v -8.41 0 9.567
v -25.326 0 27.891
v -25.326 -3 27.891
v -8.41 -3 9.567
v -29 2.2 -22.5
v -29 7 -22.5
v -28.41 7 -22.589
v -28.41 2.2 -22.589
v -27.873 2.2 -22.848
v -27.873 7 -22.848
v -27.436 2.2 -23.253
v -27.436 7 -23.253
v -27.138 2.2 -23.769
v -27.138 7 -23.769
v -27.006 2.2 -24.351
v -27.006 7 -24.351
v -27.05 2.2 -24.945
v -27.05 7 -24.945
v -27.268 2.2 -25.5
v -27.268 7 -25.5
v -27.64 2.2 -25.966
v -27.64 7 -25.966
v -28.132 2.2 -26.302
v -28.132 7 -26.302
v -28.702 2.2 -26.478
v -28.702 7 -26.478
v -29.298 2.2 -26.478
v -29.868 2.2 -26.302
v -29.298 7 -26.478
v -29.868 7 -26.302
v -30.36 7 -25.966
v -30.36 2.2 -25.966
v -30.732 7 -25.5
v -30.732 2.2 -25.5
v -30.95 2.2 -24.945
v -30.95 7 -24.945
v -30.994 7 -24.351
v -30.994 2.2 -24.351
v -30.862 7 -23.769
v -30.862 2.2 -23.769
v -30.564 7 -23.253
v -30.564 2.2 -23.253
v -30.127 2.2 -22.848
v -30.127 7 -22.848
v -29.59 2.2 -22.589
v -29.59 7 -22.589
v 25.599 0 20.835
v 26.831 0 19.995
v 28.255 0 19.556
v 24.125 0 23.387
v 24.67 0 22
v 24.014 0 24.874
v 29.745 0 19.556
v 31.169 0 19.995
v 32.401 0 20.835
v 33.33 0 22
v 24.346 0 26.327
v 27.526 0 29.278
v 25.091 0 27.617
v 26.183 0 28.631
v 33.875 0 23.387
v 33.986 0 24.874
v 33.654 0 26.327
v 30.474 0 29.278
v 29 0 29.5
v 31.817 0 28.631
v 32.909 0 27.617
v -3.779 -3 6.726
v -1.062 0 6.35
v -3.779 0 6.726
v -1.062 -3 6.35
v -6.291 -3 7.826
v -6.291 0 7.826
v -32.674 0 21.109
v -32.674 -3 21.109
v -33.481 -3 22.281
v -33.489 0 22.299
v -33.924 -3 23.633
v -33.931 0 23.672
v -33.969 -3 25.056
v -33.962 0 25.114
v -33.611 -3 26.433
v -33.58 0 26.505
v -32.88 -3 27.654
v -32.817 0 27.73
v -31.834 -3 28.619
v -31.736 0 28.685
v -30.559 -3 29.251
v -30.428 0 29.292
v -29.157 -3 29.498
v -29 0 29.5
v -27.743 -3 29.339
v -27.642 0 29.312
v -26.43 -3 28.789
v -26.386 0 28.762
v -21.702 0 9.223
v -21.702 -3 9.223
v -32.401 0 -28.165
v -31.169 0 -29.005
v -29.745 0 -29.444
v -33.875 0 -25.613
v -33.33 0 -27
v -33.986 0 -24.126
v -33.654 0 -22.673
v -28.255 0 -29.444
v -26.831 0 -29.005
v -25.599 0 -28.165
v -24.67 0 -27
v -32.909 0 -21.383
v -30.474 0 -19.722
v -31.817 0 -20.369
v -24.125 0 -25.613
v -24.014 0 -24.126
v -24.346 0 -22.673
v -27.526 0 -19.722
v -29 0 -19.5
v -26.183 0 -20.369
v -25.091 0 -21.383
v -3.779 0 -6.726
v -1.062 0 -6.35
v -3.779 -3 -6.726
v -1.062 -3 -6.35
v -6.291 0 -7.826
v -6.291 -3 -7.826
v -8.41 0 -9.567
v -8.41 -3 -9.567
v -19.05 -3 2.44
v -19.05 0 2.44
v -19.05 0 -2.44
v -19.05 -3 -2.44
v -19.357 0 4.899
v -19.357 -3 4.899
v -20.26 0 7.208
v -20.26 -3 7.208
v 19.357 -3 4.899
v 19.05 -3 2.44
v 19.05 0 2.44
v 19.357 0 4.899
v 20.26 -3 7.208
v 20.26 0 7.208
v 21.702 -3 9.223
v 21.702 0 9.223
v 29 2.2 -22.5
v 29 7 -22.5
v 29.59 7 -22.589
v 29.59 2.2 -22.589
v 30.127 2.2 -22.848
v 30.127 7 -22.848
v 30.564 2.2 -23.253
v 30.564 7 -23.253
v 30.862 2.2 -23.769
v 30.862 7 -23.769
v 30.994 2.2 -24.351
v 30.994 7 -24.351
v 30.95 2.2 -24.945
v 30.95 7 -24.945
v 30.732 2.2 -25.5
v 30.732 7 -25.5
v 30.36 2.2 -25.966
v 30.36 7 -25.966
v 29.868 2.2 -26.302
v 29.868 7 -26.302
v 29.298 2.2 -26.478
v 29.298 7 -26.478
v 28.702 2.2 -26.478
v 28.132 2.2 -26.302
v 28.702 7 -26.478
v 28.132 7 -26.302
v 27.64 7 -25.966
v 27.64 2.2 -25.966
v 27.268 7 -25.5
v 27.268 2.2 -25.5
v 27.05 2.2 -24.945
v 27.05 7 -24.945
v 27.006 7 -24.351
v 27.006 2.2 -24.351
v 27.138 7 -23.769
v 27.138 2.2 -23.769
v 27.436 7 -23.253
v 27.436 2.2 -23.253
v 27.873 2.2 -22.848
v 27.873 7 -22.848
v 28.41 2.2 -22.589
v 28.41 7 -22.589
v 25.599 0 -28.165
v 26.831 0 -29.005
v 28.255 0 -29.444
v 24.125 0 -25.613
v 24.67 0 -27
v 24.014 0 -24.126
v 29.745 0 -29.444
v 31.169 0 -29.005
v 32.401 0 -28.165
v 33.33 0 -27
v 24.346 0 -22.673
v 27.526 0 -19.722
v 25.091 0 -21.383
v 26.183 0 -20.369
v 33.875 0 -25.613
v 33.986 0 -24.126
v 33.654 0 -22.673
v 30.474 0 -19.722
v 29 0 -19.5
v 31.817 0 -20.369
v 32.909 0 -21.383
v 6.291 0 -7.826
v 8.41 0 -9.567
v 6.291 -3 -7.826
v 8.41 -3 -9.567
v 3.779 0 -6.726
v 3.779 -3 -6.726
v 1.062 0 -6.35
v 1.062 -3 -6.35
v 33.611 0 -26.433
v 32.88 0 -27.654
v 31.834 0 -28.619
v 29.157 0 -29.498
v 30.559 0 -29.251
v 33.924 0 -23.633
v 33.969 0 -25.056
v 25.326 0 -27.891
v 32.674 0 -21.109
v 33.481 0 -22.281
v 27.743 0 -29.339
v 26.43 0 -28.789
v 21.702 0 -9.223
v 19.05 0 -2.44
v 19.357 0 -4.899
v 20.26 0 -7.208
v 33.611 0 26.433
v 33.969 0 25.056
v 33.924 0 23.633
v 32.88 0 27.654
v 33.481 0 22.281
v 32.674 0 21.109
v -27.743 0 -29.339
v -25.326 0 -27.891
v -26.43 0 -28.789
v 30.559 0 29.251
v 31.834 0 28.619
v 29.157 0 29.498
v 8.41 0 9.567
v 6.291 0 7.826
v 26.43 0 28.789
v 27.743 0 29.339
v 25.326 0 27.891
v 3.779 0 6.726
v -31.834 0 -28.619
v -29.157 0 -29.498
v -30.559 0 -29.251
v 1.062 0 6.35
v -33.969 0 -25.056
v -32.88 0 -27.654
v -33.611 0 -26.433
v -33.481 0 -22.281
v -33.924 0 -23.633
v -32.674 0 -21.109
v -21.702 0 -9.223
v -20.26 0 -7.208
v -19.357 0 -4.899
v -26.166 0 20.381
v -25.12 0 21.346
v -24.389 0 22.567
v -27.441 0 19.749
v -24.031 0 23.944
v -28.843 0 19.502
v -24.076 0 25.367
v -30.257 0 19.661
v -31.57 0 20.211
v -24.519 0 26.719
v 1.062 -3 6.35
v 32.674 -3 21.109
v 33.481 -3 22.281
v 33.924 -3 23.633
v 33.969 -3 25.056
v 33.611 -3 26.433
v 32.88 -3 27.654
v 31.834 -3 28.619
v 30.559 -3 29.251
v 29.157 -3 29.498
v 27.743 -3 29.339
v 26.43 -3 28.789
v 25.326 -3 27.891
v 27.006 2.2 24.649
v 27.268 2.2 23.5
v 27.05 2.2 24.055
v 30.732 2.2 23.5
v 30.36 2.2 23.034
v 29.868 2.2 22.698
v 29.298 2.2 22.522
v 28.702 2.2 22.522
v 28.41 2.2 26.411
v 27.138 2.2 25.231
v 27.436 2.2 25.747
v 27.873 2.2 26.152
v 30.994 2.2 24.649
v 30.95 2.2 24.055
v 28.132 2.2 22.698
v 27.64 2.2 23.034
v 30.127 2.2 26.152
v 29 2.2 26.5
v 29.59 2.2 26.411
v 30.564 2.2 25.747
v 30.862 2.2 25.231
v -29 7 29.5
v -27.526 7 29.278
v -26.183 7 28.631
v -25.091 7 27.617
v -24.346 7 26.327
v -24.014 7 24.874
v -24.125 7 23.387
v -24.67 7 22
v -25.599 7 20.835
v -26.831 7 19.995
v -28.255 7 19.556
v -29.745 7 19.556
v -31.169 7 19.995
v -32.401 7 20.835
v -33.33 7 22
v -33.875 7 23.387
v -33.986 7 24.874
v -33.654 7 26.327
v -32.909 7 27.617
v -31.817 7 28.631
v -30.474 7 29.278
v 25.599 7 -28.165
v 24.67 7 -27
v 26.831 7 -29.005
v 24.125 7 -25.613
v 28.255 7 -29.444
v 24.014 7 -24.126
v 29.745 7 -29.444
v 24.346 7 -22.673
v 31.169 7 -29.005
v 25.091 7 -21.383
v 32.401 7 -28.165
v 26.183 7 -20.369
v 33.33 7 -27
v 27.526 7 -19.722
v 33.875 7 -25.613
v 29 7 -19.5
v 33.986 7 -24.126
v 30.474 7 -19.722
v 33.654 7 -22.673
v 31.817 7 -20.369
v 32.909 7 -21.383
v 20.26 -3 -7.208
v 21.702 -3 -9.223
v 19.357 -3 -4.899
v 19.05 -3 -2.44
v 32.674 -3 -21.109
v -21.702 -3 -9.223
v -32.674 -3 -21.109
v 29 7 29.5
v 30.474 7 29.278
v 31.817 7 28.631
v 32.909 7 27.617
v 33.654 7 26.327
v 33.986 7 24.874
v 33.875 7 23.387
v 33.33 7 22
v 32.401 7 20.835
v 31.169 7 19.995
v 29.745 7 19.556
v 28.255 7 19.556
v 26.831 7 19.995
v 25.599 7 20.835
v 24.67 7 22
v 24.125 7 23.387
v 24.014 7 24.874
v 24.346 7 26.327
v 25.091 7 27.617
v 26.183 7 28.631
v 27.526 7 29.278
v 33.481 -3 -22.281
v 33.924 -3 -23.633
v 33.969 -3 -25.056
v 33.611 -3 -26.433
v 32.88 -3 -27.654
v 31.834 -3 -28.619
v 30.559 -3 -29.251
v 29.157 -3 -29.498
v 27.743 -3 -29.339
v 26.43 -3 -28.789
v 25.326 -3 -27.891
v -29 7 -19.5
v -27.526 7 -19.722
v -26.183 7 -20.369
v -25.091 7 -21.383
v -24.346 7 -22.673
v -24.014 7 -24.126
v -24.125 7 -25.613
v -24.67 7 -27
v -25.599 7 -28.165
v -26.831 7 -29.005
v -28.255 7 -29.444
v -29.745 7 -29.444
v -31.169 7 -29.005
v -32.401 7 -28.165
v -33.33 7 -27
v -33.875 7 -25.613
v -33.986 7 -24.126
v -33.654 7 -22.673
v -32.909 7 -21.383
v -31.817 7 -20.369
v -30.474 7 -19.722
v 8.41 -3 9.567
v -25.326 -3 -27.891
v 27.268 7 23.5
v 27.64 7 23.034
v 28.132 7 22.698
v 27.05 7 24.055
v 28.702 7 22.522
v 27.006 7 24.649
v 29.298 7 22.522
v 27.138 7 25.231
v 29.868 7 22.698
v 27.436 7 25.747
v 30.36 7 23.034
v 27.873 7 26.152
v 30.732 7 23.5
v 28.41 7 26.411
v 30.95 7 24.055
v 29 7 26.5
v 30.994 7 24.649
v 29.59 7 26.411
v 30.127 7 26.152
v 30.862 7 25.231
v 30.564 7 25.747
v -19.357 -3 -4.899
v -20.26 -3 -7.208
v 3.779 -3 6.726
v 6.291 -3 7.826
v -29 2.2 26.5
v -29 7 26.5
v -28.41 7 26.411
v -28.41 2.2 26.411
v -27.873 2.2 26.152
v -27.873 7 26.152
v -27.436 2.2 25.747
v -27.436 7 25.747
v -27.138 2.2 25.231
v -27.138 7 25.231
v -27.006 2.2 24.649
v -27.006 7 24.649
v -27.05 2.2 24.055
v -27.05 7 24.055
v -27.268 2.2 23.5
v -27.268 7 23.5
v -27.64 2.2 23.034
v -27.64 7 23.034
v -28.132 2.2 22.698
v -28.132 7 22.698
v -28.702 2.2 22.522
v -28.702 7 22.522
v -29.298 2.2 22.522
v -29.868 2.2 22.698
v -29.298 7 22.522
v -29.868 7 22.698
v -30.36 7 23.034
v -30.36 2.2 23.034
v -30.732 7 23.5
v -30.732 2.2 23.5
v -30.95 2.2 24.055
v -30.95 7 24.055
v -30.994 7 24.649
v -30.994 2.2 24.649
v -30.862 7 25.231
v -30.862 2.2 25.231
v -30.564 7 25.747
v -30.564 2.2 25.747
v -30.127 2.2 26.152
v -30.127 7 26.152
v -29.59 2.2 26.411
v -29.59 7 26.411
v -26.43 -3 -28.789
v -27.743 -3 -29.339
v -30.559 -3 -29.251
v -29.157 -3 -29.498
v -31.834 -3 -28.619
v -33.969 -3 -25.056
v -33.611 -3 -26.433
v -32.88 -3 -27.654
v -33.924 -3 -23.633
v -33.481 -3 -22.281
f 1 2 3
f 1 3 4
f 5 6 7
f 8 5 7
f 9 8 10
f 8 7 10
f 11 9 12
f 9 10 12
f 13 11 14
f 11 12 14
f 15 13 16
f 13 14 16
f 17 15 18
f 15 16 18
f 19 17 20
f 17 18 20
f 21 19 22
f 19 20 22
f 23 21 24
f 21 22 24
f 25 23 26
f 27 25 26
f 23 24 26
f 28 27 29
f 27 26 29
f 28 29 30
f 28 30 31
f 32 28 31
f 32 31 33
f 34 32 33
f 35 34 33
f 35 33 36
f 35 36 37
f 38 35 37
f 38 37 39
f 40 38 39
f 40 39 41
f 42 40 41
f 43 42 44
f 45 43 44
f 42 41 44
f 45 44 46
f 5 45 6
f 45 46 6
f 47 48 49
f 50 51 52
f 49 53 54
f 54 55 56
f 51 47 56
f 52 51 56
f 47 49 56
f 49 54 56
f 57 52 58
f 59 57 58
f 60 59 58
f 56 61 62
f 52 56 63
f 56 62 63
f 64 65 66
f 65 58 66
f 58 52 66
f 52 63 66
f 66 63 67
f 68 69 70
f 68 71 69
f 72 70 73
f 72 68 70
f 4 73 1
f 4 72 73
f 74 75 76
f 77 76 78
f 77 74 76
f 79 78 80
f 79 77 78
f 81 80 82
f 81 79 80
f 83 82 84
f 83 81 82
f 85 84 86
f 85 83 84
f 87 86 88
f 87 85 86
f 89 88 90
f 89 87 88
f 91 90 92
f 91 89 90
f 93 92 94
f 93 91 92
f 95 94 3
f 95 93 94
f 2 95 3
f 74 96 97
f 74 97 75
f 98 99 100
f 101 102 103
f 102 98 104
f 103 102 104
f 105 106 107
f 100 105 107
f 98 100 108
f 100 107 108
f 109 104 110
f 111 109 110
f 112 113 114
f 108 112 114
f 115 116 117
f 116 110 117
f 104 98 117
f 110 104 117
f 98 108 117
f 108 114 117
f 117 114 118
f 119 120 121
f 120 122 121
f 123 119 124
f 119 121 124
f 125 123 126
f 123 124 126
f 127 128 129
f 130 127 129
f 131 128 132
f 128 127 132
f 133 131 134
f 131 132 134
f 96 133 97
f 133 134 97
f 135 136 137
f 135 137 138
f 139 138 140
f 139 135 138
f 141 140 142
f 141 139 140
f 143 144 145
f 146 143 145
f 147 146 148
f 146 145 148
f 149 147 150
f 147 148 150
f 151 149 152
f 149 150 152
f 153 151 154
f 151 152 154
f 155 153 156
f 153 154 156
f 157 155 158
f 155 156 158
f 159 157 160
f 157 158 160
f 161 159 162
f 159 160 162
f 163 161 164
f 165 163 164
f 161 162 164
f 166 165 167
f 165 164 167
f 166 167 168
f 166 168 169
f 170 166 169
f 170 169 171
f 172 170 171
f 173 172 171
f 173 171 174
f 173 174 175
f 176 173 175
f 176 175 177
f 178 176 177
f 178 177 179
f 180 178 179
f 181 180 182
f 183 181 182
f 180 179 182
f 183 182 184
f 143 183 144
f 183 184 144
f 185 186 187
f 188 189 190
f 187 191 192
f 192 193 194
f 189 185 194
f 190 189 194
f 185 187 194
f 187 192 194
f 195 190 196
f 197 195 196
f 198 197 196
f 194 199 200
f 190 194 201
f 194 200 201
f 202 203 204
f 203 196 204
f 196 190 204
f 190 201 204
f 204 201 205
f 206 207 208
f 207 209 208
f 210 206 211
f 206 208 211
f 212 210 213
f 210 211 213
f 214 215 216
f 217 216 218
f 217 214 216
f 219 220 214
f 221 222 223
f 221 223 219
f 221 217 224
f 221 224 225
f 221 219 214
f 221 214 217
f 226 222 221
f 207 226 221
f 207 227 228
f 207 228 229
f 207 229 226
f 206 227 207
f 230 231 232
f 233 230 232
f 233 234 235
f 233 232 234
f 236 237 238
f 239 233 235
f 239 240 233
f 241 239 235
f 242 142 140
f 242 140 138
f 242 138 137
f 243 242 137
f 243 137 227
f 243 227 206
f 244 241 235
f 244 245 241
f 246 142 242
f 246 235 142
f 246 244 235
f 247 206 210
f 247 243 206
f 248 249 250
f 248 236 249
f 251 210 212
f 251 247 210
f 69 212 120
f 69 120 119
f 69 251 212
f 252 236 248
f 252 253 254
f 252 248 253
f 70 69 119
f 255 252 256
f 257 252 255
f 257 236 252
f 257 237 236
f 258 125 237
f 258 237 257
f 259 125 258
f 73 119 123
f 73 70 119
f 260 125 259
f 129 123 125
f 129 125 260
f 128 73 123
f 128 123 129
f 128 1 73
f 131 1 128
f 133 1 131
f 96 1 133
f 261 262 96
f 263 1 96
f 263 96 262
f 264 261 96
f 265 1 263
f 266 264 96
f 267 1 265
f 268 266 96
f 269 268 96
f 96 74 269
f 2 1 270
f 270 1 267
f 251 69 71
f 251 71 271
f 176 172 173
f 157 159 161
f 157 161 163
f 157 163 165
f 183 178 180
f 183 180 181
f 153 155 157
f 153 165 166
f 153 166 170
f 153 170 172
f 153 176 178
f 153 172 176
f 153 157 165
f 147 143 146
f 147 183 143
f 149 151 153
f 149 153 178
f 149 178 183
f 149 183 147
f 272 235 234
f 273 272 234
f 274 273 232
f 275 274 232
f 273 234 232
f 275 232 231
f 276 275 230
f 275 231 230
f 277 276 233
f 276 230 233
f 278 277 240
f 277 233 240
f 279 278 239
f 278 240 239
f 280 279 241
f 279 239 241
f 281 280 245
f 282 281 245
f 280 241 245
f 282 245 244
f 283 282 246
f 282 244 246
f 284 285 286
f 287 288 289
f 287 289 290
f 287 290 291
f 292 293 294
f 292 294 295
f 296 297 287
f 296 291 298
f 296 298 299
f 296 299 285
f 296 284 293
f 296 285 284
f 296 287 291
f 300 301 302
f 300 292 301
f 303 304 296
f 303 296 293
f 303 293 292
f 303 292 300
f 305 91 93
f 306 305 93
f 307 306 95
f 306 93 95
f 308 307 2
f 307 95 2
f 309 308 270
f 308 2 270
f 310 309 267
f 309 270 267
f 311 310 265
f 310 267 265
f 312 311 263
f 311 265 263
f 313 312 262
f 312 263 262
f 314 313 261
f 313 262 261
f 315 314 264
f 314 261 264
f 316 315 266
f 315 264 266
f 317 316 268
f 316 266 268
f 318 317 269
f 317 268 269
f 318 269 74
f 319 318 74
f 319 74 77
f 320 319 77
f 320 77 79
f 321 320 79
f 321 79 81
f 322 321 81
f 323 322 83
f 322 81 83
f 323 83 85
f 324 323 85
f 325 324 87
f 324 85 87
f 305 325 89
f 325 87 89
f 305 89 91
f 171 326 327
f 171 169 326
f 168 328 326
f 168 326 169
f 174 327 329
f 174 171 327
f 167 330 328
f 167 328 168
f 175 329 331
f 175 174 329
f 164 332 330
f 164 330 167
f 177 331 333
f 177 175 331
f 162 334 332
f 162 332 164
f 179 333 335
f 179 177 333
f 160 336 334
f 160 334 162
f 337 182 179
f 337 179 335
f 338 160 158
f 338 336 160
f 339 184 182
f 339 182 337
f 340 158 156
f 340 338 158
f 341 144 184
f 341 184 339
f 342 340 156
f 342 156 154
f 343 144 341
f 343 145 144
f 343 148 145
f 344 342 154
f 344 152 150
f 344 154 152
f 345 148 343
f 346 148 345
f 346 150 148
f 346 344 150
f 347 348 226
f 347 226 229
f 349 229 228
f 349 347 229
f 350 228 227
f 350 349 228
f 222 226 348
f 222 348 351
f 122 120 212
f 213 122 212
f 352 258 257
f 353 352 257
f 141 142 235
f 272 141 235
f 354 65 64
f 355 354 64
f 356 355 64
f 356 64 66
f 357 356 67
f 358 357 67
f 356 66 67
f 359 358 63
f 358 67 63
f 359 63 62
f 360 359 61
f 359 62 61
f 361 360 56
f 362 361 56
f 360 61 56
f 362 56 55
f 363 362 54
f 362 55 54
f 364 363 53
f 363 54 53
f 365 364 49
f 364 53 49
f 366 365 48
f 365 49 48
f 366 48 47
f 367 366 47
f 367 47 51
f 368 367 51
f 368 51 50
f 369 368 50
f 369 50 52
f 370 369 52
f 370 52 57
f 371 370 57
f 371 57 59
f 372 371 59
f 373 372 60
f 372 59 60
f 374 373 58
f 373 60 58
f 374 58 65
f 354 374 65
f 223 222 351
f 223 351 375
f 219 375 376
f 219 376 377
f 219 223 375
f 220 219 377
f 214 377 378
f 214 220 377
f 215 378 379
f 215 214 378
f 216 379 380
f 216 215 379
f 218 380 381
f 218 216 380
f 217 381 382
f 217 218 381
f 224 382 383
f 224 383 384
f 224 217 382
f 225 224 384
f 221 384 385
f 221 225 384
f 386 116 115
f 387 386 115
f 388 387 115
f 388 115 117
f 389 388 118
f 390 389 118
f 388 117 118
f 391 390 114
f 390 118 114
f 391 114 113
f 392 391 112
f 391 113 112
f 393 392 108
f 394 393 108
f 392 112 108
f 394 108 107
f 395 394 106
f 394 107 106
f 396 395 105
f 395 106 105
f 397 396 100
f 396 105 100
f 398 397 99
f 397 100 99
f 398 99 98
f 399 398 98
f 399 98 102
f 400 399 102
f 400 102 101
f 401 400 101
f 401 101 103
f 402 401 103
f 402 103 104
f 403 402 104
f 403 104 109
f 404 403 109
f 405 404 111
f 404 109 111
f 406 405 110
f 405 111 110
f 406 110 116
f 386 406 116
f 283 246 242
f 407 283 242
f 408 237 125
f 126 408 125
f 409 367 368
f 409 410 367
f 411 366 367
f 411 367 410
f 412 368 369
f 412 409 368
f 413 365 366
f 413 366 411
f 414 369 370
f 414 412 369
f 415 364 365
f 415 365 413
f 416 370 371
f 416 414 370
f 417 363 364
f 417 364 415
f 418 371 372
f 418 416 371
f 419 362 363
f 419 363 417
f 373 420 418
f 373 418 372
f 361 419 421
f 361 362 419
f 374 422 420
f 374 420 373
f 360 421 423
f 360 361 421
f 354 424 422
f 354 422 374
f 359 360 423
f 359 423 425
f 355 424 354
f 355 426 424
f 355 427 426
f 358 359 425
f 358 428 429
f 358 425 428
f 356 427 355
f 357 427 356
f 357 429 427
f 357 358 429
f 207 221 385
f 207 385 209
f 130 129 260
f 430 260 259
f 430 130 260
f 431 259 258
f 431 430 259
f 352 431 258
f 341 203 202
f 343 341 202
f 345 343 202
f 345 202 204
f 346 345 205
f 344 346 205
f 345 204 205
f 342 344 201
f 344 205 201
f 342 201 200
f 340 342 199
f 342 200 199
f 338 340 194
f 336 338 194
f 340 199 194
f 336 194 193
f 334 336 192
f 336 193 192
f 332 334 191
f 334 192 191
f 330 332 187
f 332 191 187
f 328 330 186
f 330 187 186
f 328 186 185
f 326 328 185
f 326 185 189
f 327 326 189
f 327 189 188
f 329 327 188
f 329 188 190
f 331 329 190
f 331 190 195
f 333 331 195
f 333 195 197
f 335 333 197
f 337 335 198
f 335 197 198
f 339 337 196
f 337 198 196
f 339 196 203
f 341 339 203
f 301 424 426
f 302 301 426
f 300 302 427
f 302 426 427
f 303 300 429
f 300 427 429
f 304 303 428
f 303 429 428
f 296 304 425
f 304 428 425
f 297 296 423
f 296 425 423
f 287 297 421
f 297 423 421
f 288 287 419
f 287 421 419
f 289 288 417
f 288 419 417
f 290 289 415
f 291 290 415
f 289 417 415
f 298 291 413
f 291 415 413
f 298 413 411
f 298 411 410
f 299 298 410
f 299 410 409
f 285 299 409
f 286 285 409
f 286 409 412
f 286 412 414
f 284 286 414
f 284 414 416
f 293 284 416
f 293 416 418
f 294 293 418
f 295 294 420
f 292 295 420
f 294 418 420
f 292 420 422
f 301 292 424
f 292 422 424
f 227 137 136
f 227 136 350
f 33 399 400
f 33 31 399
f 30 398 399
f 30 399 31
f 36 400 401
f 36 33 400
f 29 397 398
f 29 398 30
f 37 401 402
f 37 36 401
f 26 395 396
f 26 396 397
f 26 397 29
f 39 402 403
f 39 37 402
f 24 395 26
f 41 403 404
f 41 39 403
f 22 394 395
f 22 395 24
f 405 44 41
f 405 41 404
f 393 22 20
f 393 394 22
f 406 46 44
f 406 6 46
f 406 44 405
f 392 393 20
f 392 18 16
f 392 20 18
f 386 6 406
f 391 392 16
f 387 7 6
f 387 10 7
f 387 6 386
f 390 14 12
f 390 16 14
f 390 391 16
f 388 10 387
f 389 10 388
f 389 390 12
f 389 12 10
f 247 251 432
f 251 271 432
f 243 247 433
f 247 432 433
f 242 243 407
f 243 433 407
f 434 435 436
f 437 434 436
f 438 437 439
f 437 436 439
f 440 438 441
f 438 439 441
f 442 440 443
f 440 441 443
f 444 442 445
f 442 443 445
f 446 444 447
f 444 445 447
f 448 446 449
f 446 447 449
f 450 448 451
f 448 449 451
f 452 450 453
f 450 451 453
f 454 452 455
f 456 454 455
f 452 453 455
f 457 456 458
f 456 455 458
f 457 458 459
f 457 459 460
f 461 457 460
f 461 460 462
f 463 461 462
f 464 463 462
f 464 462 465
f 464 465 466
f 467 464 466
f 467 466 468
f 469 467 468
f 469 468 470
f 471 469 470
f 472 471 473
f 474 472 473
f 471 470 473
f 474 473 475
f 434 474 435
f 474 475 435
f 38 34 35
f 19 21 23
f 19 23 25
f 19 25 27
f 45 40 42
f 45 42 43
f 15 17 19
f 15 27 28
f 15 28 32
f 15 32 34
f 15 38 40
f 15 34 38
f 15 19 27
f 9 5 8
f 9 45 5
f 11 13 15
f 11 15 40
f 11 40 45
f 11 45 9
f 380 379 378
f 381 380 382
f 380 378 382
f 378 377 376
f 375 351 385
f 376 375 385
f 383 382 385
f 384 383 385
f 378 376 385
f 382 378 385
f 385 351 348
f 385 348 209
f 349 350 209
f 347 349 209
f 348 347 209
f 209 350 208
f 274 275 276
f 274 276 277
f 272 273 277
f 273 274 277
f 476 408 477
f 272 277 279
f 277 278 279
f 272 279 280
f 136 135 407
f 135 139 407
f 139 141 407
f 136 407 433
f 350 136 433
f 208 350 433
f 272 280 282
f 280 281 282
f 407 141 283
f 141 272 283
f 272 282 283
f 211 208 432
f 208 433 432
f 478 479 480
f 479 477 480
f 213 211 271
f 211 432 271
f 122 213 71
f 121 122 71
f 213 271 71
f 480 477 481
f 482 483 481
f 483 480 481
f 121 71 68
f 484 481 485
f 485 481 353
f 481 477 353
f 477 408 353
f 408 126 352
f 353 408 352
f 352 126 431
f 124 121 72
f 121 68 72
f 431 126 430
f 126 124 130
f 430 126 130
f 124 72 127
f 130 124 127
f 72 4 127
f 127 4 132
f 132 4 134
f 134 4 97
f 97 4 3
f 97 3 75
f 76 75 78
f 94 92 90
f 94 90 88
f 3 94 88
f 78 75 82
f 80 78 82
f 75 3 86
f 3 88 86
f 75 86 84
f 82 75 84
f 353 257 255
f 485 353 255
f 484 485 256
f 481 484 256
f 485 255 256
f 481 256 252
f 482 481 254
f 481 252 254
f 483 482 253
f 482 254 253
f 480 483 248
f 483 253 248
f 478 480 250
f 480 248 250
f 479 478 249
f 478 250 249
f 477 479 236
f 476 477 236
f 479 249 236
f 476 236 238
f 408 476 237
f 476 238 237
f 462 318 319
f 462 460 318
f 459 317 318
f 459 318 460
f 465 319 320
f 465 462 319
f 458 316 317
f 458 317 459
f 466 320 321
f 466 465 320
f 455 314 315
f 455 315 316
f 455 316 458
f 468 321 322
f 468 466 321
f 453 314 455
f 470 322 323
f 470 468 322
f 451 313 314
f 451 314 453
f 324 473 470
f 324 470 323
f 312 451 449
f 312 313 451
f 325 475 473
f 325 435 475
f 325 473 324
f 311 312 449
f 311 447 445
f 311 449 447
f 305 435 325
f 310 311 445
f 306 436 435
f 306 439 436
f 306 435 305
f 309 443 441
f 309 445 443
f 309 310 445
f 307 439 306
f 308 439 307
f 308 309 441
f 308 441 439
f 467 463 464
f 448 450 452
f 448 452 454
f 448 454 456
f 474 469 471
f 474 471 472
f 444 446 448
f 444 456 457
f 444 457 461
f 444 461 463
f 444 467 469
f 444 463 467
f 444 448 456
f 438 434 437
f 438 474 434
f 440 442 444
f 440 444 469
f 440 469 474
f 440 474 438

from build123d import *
from build123d.topology import SkipClean

# Parameters (mm, degrees)
SKETCH2_R             = 5
BOSS_EXTRUDE1_DEPTH   = 7
BOSS_EXTRUDE1_2_DEPTH = 7
BOSS_EXTRUDE1_3_DEPTH = 7
BOSS_EXTRUDE1_4_DEPTH = 7
SKETCH3_R             = 2
CUT_EXTRUDE2_DEPTH    = 4.8
SKETCH4_W             = 38.1
SKETCH4_H             = 12.7
BOSS_EXTRUDE2_DEPTH   = 3
BOSS_EXTRUDE3_DEPTH   = 3
MIRROR4_COPY_1_DEPTH  = 3
FILLET1_R             = 10


with BuildPart() as part:
    # Sketch2 → Boss-Extrude1 (new body)
    with BuildSketch(Plane(origin=(0, 0, 0), x_dir=(1, 0, 0), z_dir=(0, 1, 0))):
        with Locations(Location((-29, 24.5, 0), (0, 0, 270))):
            Circle(SKETCH2_R)
    extrude(amount=BOSS_EXTRUDE1_DEPTH)


with BuildPart() as body_2:
    # Sketch2 → Boss-Extrude1 2 (new body)
    with BuildSketch(Plane(origin=(0, 0, 0), x_dir=(1, 0, 0), z_dir=(0, 1, 0))):
        with Locations(Location((-29, -24.5, 0), (0, 0, 270))):
            Circle(SKETCH2_R)
    extrude(amount=BOSS_EXTRUDE1_2_DEPTH)


with BuildPart() as body_3:
    # Sketch2 → Boss-Extrude1 3 (new body)
    with BuildSketch(Plane(origin=(0, 0, 0), x_dir=(1, 0, 0), z_dir=(0, 1, 0))):
        with Locations(Location((29, 24.5, 0), (0, 0, 270))):
            Circle(SKETCH2_R)
    extrude(amount=BOSS_EXTRUDE1_3_DEPTH)


with BuildPart() as body_4:
    # Sketch2 → Boss-Extrude1 4 (new body)
    with BuildSketch(Plane(origin=(0, 0, 0), x_dir=(1, 0, 0), z_dir=(0, 1, 0))):
        with Locations(Location((29, -24.5, 0), (0, 0, 270))):
            Circle(SKETCH2_R)
    extrude(amount=BOSS_EXTRUDE1_4_DEPTH)


with BuildPart() as cut_extrude2_tool:
    # Sketch3 → Cut-Extrude2 (new body)
    with BuildSketch(Plane(origin=(0, 7, 0), x_dir=(1, 0, 0), z_dir=(0, 1, 0))):
        with Locations(Location((-29, 24.5, 0), (0, 0, 270))):
            Circle(SKETCH3_R)
        with Locations(Location((-29, -24.5, 0), (0, 0, 270))):
            Circle(SKETCH3_R)
        with Locations(Location((29, -24.5, 0), (0, 0, 270))):
            Circle(SKETCH3_R)
        with Locations(Location((29, 24.5, 0), (0, 0, 270))):
            Circle(SKETCH3_R)
    extrude(amount=-CUT_EXTRUDE2_DEPTH)


with BuildPart() as part_1:
    add(part.part)

    # Cut-Extrude2: cut by cut_extrude2_tool
    add(cut_extrude2_tool.part, mode=Mode.SUBTRACT)


with BuildPart() as body_2_1:
    add(body_2.part)

    # Cut-Extrude2: cut by cut_extrude2_tool
    add(cut_extrude2_tool.part, mode=Mode.SUBTRACT)



with BuildPart() as body_3_1:
    add(body_3.part)

    # Cut-Extrude2: cut by cut_extrude2_tool
    add(cut_extrude2_tool.part, mode=Mode.SUBTRACT)


with BuildPart() as body_4_1:
    add(body_4.part)

    # Cut-Extrude2: cut by cut_extrude2_tool
    add(cut_extrude2_tool.part, mode=Mode.SUBTRACT)


with BuildPart() as body_5:
    # Sketch4 → Boss-Extrude2 (new body)
    with BuildSketch(Plane(origin=(0, 0, 0), x_dir=(1, 0, 0), z_dir=(0, 1, 0))):
        Rectangle(SKETCH4_W, SKETCH4_H)
    extrude(amount=-BOSS_EXTRUDE2_DEPTH)


with BuildPart() as body_2_2:
    with SkipClean():  # the faces are left unmerged after this step: merging them gives an invalid solid
        add(body_2_1.part)

        add(body_5.part)  # Boss-Extrude3 merges body 5
        # Sketch5 → Boss-Extrude3 (add)
        with BuildSketch(Plane(origin=(0, 0, 0), x_dir=(1, 0, 0), z_dir=(0, 1, 0))):
            with BuildLine():
                Line((-5.44059921, -6.35), (-19.05, -6.35))
                Line((-19.05, -6.35), (-32.67393104, -21.108506124))
                ThreePointArc((-32.67393104, -21.108506124), (-32.391493876, -28.17393104), (-25.32606896, -27.891493876))
                Line((-25.32606896, -27.891493876), (-5.44059921, -6.35))
            make_face()
        boss_extrude3 = extrude(amount=-BOSS_EXTRUDE3_DEPTH)

    # Mirror3: Boss-Extrude3 across plane
    with SkipClean():  # the faces are left unmerged after this step: merging them gives an invalid solid
        add(boss_extrude3.mirror(Plane(origin=(0, 0, 0), x_dir=(0, 0, 1), z_dir=(1, 0, 0))))

    # Mirror4: Boss-Extrude3 across plane
    with SkipClean():  # the faces are left unmerged after this step: merging them gives an invalid solid
        add(boss_extrude3.mirror(Plane.XY))

    # Mirror4 copy 1 sketch → Mirror4 copy 1 (add)
    with SkipClean():  # the faces are left unmerged after this step: merging them gives an invalid solid
        with BuildSketch(Plane(origin=(0, 0, 0), x_dir=(-1, 0, 0), z_dir=(0, 1, 0))):
            with BuildLine():
                Line((-5.44059921, -6.35), (-19.05, -6.35))
                Line((-19.05, -6.35), (-32.67393104, -21.108506124))
                ThreePointArc((-32.67393104, -21.108506124), (-32.391493876, -28.17393104), (-25.32606896, -27.891493876))
                Line((-25.32606896, -27.891493876), (-5.44059921, -6.35))
            make_face()
        extrude(amount=-MIRROR4_COPY_1_DEPTH)

    # Fillet1
    fillet1_edges = [body_2_2.edges().sort_by_distance(p)[0] for p in [
        (-19.05, -1.5, 6.35),
        (-5.44059921, -1.5, 6.35),
        (19.05, -1.5, 6.35),
        (19.05, -1.5, -6.35),
        (-19.05, -1.5, -6.35),
        (5.44059921, -1.5, 6.35),
        (5.44059921, -1.5, -6.35),
        (-5.44059921, -1.5, -6.35),
    ]]
    fillet(fillet1_edges, radius=FILLET1_R)


solid = Compound([part_1.part, body_3_1.part, body_4_1.part, body_2_2.part])
